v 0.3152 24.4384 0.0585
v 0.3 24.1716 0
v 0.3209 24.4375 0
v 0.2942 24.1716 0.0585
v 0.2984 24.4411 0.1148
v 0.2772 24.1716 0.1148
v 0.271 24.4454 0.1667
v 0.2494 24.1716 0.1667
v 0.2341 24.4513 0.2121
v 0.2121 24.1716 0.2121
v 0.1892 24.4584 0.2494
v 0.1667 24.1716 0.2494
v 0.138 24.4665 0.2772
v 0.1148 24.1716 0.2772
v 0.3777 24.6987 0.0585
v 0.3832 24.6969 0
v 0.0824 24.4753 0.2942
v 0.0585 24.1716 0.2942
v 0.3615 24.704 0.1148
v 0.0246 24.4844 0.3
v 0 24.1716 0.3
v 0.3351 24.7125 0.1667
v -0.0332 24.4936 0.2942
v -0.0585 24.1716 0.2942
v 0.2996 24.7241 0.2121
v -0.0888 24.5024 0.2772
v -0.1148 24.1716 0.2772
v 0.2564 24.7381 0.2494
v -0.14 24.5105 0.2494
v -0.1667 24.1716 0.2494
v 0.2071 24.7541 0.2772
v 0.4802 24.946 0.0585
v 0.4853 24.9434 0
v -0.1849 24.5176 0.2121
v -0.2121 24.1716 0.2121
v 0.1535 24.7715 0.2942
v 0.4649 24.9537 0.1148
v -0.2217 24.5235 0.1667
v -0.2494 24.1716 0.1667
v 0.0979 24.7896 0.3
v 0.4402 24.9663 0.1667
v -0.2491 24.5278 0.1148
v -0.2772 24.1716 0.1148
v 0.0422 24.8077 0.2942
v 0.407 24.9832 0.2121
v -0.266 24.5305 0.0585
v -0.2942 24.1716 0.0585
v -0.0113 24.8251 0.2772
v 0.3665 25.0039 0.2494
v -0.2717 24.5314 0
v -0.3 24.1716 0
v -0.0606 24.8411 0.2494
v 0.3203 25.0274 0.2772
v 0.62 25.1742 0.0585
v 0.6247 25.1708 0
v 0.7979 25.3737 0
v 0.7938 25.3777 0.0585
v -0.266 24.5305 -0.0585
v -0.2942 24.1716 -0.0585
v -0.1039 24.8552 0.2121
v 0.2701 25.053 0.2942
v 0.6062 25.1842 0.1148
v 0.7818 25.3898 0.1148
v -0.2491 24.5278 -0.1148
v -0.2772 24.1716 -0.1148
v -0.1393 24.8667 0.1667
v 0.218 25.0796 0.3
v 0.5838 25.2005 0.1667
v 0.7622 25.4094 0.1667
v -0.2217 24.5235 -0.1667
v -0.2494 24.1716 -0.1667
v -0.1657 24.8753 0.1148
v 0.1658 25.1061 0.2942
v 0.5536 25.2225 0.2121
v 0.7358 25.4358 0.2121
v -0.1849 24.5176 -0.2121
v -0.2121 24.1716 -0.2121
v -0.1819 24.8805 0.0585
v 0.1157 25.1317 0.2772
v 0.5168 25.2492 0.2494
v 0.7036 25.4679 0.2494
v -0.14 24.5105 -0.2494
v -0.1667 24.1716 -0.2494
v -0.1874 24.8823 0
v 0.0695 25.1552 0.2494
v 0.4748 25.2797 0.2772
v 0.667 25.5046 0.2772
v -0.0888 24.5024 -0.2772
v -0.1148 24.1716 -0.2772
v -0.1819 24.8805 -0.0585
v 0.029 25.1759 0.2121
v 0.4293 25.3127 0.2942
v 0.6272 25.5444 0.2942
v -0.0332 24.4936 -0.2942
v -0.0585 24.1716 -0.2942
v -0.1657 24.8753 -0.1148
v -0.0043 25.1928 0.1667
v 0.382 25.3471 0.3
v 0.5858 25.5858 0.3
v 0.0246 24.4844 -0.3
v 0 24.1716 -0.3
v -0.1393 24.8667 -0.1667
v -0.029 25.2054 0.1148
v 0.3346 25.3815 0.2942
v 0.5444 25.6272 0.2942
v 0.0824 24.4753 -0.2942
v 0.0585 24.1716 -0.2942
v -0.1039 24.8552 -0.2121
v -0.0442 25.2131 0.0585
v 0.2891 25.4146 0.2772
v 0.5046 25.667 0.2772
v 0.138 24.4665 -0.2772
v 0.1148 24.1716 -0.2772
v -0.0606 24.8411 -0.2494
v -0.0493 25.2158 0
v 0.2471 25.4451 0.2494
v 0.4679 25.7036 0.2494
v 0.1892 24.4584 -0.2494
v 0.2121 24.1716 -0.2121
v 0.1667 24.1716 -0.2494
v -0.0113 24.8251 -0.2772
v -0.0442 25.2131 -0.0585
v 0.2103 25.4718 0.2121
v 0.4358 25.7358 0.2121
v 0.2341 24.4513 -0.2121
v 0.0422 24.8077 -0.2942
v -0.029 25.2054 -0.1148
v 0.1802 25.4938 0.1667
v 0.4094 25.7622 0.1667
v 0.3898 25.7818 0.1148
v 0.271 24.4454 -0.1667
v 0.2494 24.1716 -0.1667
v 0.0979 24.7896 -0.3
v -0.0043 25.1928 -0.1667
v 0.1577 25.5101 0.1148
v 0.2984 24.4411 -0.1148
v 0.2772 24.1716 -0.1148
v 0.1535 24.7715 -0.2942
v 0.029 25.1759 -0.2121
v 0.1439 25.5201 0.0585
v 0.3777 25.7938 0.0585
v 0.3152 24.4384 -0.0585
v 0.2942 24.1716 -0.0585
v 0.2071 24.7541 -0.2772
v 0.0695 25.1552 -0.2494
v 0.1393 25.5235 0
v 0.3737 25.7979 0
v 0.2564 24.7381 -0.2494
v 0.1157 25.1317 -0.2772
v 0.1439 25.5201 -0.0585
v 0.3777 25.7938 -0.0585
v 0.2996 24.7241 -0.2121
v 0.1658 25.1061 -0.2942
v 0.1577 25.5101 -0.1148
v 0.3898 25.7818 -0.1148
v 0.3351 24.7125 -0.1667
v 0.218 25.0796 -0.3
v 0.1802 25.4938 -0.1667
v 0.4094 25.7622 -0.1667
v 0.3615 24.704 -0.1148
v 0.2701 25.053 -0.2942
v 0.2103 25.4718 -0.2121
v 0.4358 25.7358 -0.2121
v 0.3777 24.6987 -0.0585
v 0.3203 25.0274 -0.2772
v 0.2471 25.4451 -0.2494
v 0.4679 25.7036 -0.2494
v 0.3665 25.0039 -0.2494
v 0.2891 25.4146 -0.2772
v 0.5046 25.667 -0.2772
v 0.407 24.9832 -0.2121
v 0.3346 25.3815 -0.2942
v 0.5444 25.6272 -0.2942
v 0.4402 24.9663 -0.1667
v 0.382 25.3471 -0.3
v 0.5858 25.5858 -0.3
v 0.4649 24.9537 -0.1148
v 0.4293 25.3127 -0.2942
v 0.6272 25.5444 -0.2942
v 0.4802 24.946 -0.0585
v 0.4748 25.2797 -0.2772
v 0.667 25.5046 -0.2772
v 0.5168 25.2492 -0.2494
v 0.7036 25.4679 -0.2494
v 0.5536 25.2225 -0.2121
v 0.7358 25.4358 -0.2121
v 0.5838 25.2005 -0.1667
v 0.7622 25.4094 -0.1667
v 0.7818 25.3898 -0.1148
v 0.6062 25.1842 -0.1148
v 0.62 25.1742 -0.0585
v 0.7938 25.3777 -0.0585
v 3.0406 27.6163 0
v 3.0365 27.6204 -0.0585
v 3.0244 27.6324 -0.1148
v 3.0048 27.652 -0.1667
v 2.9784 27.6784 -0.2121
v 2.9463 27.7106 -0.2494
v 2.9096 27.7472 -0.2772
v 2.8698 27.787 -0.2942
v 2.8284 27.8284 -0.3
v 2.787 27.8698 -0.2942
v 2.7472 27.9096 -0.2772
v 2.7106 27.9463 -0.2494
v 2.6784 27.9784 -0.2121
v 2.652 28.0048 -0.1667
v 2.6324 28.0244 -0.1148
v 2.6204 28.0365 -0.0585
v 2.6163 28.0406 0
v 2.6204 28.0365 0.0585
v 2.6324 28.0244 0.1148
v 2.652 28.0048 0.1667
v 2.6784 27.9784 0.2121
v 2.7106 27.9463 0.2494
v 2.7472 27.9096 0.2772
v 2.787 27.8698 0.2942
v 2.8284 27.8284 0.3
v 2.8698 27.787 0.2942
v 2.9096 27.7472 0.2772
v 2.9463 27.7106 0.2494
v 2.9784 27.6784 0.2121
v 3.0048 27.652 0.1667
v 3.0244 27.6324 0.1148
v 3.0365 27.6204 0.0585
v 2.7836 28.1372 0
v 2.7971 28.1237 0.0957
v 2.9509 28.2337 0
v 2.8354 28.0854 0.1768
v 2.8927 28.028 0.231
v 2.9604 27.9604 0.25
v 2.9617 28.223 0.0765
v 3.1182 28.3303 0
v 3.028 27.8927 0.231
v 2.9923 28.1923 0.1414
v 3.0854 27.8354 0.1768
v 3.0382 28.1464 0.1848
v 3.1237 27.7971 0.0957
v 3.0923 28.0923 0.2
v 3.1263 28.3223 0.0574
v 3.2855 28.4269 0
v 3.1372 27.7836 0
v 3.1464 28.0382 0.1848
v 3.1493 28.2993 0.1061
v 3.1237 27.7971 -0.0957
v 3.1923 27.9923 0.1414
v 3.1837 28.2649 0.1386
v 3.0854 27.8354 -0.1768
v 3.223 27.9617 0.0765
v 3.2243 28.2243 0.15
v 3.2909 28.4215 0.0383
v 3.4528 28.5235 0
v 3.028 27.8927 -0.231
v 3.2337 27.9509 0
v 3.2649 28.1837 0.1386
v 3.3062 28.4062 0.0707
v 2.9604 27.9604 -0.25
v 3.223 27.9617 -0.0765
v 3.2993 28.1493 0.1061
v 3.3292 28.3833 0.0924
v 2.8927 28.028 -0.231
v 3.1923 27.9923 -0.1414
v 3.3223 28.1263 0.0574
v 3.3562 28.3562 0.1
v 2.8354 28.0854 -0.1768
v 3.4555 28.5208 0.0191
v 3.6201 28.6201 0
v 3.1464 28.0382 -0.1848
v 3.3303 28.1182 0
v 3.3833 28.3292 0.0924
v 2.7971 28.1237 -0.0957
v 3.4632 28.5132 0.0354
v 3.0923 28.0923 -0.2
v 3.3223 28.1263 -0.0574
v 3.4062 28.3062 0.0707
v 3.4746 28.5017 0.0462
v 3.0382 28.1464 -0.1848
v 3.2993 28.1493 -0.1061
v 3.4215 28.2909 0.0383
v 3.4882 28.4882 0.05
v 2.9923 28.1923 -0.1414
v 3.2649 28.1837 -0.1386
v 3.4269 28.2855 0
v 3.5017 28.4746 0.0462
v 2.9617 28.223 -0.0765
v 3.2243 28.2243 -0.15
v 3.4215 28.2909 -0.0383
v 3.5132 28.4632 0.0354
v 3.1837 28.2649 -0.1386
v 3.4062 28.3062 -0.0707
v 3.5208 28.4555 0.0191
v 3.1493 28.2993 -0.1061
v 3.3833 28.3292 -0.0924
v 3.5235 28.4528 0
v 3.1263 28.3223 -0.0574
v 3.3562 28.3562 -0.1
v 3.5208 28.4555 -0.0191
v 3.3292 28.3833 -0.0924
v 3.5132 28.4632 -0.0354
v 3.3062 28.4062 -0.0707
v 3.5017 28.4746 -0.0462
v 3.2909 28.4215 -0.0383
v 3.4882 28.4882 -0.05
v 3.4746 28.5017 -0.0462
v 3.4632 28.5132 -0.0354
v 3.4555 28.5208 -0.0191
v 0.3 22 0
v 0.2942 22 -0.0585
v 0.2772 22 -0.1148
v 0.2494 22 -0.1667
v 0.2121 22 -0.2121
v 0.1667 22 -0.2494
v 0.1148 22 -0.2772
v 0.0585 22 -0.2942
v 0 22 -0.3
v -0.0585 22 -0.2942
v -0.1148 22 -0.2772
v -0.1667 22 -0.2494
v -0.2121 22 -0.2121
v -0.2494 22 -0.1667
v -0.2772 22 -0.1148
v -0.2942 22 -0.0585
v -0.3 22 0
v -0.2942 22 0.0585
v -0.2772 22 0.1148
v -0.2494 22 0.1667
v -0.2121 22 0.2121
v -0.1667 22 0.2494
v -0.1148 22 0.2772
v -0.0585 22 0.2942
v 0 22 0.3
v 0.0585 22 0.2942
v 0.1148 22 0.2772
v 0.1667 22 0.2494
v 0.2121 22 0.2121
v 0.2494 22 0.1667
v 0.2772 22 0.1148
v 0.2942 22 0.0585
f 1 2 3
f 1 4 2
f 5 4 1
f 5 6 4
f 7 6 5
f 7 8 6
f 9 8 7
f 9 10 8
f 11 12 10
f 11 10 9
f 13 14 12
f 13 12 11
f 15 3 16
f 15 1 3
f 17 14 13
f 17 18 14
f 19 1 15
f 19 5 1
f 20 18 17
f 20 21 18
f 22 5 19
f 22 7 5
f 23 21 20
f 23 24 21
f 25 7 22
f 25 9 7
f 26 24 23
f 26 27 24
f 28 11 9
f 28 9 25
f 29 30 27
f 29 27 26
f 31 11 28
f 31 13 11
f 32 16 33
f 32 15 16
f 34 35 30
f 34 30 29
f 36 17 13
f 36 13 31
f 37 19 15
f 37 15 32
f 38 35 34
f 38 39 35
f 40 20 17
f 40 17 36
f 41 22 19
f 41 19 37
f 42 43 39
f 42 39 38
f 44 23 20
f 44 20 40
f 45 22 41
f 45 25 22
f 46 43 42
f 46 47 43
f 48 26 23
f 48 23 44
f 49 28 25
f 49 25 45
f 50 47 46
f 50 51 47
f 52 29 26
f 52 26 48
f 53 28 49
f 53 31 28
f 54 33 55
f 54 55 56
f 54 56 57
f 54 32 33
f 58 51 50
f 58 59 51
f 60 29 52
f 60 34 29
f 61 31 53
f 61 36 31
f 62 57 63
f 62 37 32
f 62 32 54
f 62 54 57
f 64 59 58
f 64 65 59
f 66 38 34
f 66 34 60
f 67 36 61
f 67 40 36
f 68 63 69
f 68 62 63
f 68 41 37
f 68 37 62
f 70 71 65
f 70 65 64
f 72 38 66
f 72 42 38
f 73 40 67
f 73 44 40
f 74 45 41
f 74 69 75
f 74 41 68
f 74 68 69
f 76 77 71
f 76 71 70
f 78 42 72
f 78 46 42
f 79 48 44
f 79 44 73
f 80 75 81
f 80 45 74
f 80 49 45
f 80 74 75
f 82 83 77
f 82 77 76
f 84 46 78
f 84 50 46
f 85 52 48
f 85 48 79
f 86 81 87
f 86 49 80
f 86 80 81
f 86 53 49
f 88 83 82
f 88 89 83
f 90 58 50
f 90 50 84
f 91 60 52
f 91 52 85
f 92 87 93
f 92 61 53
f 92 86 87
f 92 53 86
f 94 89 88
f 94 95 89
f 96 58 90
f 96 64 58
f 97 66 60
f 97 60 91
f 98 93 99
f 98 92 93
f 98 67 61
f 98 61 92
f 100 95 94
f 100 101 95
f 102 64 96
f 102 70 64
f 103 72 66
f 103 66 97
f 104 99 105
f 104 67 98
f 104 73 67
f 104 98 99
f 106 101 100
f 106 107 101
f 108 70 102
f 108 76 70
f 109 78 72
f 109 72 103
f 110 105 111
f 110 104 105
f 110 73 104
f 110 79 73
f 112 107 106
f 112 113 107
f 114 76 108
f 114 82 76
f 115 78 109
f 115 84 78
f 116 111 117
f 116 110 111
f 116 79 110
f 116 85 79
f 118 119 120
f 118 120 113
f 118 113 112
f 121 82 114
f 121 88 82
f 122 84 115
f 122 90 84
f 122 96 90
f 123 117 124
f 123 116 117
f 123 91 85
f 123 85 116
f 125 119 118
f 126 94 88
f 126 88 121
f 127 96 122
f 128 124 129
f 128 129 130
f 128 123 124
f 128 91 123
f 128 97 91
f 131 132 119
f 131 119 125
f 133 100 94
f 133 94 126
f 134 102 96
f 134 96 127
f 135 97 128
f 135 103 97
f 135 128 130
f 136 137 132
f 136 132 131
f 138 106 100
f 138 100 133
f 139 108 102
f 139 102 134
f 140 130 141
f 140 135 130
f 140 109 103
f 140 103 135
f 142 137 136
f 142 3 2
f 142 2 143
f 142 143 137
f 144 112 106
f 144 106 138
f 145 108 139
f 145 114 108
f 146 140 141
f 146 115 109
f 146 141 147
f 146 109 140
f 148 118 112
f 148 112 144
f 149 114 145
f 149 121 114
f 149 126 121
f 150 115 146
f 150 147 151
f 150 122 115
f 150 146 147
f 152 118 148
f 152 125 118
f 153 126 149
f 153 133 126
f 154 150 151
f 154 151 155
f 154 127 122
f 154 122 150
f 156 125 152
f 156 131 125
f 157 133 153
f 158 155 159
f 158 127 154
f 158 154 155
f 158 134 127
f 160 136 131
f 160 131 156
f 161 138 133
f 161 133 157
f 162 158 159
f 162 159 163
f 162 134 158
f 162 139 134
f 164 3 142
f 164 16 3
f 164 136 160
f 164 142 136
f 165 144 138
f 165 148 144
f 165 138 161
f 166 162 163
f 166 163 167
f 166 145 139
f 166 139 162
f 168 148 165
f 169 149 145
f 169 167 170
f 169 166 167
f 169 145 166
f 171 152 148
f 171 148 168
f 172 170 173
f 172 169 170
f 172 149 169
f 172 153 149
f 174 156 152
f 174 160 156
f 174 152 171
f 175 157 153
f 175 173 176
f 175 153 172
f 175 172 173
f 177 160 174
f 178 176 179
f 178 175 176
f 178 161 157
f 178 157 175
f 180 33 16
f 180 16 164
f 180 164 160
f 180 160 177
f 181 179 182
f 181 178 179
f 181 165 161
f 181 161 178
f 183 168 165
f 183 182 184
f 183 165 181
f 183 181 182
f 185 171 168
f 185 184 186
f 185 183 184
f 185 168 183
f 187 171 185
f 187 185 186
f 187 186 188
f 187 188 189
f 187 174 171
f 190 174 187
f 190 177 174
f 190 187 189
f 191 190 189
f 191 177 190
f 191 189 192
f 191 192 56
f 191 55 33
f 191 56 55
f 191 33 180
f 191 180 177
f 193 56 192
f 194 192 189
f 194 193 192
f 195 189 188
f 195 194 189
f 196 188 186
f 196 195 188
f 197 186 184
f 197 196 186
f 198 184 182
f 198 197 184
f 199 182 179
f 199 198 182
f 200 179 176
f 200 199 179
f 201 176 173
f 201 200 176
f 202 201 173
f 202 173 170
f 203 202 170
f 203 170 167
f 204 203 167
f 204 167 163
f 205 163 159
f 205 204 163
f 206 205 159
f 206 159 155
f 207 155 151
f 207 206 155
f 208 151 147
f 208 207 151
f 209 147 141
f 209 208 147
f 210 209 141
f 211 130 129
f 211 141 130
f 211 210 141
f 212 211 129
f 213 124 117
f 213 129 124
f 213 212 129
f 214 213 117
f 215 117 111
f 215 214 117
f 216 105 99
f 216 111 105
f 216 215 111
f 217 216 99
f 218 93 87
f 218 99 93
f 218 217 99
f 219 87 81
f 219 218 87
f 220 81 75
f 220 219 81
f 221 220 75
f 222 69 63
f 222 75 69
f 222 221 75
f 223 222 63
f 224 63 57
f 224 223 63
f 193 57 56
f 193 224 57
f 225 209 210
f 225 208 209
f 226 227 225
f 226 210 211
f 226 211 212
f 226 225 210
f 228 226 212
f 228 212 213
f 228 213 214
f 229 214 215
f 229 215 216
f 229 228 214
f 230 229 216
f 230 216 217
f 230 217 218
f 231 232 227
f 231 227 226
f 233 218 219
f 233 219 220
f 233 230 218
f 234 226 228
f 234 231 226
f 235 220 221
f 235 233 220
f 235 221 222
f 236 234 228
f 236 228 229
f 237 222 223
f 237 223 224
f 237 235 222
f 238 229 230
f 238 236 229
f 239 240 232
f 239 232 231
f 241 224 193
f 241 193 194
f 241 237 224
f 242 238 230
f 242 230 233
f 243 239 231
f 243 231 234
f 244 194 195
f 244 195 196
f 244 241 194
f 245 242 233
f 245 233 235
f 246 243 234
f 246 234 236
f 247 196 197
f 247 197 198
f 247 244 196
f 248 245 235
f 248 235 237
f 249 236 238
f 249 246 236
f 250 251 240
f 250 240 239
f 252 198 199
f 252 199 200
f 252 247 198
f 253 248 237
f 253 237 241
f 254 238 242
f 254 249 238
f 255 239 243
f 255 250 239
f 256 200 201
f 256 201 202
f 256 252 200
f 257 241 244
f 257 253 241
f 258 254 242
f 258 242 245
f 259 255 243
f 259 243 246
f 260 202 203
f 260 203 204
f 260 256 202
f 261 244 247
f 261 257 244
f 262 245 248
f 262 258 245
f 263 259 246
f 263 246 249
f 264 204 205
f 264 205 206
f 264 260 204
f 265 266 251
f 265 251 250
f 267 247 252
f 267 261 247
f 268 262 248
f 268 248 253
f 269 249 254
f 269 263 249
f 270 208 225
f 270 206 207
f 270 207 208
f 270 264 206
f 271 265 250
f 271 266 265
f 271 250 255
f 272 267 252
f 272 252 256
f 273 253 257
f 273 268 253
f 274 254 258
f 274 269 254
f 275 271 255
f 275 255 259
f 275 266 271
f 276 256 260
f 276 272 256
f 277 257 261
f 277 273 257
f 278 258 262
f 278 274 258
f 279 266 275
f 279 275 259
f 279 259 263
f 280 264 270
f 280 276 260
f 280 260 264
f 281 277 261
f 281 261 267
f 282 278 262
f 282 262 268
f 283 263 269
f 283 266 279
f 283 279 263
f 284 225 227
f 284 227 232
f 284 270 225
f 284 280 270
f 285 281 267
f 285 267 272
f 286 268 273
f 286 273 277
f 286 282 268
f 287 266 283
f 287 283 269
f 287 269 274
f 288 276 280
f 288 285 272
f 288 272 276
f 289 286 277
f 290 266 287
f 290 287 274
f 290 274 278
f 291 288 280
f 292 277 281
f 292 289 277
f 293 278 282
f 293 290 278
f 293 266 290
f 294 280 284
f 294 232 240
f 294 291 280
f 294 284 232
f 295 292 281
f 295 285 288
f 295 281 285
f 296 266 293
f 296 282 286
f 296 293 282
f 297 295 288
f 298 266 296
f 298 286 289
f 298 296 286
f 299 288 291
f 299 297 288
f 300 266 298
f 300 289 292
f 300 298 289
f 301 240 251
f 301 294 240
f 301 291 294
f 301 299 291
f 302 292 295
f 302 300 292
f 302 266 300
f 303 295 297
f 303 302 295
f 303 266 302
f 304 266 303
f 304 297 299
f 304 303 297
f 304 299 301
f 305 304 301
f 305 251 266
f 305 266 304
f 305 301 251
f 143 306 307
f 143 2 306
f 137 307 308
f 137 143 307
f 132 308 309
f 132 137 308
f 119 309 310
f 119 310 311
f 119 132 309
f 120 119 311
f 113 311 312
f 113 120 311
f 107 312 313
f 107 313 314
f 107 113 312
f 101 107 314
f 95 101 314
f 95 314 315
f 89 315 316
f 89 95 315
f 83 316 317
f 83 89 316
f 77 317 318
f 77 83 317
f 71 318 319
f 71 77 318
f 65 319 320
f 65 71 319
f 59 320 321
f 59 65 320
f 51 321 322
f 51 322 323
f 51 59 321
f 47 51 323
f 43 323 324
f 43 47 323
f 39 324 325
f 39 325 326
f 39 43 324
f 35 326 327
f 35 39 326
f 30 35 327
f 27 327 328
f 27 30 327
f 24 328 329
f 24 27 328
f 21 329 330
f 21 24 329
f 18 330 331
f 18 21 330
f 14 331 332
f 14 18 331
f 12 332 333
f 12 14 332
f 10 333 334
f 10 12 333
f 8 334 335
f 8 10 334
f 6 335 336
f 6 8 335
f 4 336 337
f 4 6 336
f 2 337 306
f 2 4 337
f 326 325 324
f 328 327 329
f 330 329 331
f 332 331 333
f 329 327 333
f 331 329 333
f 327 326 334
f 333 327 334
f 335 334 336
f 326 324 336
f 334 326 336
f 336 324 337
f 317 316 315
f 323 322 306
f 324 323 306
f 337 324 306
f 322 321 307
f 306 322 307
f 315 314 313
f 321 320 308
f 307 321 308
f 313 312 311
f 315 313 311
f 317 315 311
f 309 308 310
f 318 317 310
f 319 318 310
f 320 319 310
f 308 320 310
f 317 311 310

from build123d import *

# Parameters (mm, degrees)
SKETCH8_R               = 0.3
CUT_EXTRUDE1_DEPTH      = 29.849717382
CUT_EXTRUDE1_DEPTH_BACK = 29.849717382
SKETCH10_W              = 5
SKETCH10_H              = 44


with BuildPart() as part:
    # Sweep1: sweep along a path in Sketch7
    with BuildLine(Plane.XY) as sweep1_path:
        Line((0, 0), (0, 24.171572875))
        ThreePointArc((0, 24.171572875), (0.152240935, 24.93693974), (0.585786438, 25.585786438))
        Line((0.585786438, 25.585786438), (2.828427125, 27.828427125))
    # Sketch8 → Sweep1 (sweep)
    with BuildSketch(Plane(origin=(0, 0, 0), x_dir=(1, 0, 0), z_dir=(0, 1, 0))):
        Circle(SKETCH8_R)
    sweep(path=sweep1_path.line)

    # Sketch9 → Revolve2 (revolve)
    with BuildSketch(Plane.XY):
        Polygon((2.61629509, 28.040559159), (3.620114655, 28.620114655), (2.828427125, 27.828427125), align=None)
    revolve(axis=Axis((2.285405043, 27.285405043, 0), (0.7071067811865509, 0.7071067811865442, 0)))

    # Sketch10 → Cut-Extrude1 (cut, two sides: drawn at the far end of the back side and taken through both)
    with BuildSketch(Plane.XY.offset(-CUT_EXTRUDE1_DEPTH_BACK)):
        Rectangle(SKETCH10_W, SKETCH10_H)
    extrude(amount=CUT_EXTRUDE1_DEPTH + CUT_EXTRUDE1_DEPTH_BACK, mode=Mode.SUBTRACT)


solid = part.part
